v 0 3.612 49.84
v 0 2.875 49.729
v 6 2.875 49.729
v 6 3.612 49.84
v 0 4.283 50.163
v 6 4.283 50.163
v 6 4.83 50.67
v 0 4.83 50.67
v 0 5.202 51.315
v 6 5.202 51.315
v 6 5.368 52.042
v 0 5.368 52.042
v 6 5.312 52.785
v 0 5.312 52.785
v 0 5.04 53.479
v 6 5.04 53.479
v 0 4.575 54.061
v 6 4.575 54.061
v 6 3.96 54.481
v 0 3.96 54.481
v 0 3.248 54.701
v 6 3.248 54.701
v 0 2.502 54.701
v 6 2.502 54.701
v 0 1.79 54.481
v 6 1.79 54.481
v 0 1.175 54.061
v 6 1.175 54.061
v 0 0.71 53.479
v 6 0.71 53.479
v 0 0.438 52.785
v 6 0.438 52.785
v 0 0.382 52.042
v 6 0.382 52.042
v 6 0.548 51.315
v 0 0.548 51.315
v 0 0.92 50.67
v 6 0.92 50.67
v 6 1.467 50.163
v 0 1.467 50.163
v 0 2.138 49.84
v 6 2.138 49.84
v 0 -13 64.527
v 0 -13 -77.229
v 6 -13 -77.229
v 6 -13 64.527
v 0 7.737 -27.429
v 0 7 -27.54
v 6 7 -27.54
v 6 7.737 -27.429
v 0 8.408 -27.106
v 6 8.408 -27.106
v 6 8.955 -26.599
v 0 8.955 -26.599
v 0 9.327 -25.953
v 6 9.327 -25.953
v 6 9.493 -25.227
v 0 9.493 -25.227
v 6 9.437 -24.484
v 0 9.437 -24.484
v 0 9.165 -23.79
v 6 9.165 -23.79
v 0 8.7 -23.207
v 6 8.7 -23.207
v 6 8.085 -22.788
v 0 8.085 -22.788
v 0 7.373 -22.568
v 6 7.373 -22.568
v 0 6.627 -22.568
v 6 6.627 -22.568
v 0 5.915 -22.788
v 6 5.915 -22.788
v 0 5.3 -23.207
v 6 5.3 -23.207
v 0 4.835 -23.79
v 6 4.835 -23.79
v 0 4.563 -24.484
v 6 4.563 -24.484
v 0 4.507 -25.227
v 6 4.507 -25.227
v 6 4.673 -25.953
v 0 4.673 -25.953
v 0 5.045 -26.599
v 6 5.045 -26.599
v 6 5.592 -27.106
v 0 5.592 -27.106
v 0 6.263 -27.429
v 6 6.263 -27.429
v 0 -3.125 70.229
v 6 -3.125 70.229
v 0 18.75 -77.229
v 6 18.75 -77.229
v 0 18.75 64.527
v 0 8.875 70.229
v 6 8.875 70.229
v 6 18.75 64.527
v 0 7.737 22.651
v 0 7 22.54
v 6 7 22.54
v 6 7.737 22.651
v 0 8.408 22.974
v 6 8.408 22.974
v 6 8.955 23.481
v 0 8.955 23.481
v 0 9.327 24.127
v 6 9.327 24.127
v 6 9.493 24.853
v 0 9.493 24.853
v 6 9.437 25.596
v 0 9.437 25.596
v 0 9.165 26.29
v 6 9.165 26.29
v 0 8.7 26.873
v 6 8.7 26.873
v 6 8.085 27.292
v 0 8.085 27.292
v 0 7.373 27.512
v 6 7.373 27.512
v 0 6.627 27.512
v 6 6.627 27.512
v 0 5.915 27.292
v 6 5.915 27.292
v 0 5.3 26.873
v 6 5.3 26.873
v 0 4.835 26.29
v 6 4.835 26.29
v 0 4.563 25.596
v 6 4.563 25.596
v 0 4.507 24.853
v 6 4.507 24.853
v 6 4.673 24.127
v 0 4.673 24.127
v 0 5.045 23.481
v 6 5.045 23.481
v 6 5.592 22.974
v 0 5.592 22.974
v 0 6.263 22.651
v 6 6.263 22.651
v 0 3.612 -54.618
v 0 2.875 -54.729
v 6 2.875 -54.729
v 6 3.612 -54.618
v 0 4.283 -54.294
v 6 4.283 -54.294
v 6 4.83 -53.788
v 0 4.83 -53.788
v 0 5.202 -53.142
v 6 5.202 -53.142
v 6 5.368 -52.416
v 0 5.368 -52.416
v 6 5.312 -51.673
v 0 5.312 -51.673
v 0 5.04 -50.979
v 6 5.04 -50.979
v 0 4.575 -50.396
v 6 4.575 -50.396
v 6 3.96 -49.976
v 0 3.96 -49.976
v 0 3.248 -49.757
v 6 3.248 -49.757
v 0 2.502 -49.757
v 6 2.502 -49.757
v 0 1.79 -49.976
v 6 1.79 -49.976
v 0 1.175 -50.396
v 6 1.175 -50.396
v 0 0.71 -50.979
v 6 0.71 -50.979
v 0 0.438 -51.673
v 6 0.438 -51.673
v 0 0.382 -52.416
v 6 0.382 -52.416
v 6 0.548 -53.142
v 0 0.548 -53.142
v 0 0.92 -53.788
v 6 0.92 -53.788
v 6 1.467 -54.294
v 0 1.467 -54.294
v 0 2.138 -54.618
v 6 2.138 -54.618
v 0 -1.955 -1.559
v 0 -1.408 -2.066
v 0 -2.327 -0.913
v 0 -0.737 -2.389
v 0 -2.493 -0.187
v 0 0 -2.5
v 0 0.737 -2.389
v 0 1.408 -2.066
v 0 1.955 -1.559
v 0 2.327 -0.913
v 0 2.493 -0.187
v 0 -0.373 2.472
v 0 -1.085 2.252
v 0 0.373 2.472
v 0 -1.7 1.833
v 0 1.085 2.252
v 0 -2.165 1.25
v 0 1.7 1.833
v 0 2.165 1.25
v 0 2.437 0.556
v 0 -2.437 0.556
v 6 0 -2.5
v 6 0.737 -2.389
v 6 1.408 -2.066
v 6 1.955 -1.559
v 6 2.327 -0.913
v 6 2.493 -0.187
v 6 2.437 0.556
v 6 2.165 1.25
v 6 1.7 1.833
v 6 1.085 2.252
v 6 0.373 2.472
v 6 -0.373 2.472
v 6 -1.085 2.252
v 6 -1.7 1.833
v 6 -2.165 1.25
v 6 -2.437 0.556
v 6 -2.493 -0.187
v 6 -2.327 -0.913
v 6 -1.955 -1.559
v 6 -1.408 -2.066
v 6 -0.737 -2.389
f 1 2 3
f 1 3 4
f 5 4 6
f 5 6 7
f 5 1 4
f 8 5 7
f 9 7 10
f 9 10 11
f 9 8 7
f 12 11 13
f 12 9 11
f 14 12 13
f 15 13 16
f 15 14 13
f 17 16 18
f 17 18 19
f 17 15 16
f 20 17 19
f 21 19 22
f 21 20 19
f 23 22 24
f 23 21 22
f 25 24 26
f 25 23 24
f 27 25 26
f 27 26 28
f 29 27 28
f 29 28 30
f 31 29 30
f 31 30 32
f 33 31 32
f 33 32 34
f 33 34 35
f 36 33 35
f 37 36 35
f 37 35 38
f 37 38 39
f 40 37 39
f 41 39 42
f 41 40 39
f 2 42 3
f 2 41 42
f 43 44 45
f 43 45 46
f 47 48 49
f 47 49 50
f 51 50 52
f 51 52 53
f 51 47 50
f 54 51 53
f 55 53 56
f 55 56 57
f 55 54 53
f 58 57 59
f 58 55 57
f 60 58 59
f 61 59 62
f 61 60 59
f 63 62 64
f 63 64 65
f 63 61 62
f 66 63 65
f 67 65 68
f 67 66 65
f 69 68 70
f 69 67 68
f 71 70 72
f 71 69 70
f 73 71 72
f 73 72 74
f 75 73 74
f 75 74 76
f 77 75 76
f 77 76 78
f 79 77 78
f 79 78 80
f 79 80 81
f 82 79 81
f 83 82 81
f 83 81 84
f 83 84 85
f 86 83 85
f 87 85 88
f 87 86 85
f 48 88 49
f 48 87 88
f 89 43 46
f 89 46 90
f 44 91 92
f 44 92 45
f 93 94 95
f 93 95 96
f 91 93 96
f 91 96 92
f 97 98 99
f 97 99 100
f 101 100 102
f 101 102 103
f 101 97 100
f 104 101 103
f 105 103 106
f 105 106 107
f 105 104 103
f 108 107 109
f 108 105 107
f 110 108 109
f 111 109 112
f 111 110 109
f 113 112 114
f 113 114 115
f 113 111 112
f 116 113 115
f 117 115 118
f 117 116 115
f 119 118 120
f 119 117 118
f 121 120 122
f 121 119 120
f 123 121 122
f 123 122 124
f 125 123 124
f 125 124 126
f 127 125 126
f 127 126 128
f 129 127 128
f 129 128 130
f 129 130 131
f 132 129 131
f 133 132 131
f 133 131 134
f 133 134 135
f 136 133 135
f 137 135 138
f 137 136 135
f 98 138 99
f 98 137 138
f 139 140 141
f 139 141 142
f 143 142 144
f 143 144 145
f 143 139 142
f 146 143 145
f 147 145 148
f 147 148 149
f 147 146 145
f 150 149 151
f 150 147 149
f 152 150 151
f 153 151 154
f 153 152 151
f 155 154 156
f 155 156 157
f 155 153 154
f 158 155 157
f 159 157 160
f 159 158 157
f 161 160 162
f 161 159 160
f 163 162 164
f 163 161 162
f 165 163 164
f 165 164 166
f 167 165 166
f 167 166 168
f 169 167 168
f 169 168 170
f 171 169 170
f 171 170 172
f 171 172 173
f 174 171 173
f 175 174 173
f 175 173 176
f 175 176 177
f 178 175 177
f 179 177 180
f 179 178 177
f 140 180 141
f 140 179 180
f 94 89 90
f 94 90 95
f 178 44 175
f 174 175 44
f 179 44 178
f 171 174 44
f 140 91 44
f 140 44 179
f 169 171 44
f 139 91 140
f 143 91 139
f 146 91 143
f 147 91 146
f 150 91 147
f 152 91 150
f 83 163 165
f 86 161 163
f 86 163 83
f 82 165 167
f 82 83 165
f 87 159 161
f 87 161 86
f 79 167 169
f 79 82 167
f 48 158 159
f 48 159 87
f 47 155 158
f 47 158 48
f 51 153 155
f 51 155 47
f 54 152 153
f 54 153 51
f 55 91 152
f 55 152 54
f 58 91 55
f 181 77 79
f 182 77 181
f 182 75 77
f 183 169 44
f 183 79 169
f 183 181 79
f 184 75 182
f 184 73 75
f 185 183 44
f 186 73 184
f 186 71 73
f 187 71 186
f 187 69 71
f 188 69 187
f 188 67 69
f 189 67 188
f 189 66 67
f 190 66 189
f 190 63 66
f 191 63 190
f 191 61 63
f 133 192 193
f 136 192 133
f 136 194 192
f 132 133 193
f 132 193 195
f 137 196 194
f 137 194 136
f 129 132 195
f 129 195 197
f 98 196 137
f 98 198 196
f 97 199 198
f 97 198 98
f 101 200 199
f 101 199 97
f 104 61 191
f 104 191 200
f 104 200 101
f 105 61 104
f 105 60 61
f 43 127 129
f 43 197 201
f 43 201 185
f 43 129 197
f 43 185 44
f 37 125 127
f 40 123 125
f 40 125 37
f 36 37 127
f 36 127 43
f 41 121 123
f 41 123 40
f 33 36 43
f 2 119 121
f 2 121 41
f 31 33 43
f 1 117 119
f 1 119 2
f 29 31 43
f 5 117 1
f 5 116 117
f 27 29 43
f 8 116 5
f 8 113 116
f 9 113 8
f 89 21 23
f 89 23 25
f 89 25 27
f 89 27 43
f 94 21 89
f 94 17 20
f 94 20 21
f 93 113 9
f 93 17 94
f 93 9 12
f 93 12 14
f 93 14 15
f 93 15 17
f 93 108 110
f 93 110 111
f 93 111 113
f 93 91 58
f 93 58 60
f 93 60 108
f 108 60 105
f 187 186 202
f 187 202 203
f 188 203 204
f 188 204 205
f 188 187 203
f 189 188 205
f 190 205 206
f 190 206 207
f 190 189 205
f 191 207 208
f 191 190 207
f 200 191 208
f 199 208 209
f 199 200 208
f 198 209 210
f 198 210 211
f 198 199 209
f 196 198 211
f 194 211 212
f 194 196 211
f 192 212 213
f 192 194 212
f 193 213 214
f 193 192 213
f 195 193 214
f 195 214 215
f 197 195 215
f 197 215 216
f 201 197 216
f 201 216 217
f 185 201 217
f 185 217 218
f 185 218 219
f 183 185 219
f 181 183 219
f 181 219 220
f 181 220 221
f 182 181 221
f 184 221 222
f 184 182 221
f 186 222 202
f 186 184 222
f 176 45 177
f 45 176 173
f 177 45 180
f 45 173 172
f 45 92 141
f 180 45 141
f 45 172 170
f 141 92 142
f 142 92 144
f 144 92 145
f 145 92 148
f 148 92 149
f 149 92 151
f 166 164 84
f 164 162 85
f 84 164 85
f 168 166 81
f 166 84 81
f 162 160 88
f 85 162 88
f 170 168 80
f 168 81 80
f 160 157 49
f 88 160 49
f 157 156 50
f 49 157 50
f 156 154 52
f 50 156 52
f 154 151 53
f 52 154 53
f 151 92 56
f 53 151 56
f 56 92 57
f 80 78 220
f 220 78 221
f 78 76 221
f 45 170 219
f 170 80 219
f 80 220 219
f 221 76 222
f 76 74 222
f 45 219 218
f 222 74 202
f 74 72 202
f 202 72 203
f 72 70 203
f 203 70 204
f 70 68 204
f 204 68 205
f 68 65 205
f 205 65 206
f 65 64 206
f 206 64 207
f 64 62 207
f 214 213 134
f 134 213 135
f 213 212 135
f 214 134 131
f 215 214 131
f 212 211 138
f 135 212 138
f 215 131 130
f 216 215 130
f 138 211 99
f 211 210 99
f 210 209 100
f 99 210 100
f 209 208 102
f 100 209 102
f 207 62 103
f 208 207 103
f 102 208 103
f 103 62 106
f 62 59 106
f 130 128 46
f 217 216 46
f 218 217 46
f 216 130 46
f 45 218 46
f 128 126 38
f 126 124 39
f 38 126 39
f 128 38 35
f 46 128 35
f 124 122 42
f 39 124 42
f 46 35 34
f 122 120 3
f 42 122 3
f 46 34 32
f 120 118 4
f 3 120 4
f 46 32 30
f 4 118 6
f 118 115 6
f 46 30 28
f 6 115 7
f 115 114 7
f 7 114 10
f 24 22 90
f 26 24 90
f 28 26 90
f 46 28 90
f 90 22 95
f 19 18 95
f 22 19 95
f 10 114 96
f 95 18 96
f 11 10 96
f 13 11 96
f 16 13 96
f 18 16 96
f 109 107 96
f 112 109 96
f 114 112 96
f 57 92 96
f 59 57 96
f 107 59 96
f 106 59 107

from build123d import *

# Parameters (mm, degrees)
SKETCH2_R           = 2.5
BOSS_EXTRUDE1_DEPTH = 6


with BuildPart() as part:
    # Sketch2 → Boss-Extrude1 (new body)
    with BuildSketch(Plane(origin=(0, 0, 0), x_dir=(0, 0, -1), z_dir=(1, 0, 0))):
        Polygon((-64.527499051, -13), (-70.228832959, -3.125), (-70.228832959, 8.875), (-64.527499051, 18.75), (77.228832959, 18.75), (77.228832959, -13), align=None)
        Circle(SKETCH2_R, mode=Mode.SUBTRACT)
        with Locations((-25.039968051, 7)):
            Circle(SKETCH2_R, mode=Mode.SUBTRACT)
        with Locations((-52.228832959, 2.875)):
            Circle(SKETCH2_R, mode=Mode.SUBTRACT)
        with Locations((52.228832959, 2.875)):
            Circle(SKETCH2_R, mode=Mode.SUBTRACT)
        with Locations((25.039968051, 7)):
            Circle(SKETCH2_R, mode=Mode.SUBTRACT)
    extrude(amount=BOSS_EXTRUDE1_DEPTH)


solid = part.part
